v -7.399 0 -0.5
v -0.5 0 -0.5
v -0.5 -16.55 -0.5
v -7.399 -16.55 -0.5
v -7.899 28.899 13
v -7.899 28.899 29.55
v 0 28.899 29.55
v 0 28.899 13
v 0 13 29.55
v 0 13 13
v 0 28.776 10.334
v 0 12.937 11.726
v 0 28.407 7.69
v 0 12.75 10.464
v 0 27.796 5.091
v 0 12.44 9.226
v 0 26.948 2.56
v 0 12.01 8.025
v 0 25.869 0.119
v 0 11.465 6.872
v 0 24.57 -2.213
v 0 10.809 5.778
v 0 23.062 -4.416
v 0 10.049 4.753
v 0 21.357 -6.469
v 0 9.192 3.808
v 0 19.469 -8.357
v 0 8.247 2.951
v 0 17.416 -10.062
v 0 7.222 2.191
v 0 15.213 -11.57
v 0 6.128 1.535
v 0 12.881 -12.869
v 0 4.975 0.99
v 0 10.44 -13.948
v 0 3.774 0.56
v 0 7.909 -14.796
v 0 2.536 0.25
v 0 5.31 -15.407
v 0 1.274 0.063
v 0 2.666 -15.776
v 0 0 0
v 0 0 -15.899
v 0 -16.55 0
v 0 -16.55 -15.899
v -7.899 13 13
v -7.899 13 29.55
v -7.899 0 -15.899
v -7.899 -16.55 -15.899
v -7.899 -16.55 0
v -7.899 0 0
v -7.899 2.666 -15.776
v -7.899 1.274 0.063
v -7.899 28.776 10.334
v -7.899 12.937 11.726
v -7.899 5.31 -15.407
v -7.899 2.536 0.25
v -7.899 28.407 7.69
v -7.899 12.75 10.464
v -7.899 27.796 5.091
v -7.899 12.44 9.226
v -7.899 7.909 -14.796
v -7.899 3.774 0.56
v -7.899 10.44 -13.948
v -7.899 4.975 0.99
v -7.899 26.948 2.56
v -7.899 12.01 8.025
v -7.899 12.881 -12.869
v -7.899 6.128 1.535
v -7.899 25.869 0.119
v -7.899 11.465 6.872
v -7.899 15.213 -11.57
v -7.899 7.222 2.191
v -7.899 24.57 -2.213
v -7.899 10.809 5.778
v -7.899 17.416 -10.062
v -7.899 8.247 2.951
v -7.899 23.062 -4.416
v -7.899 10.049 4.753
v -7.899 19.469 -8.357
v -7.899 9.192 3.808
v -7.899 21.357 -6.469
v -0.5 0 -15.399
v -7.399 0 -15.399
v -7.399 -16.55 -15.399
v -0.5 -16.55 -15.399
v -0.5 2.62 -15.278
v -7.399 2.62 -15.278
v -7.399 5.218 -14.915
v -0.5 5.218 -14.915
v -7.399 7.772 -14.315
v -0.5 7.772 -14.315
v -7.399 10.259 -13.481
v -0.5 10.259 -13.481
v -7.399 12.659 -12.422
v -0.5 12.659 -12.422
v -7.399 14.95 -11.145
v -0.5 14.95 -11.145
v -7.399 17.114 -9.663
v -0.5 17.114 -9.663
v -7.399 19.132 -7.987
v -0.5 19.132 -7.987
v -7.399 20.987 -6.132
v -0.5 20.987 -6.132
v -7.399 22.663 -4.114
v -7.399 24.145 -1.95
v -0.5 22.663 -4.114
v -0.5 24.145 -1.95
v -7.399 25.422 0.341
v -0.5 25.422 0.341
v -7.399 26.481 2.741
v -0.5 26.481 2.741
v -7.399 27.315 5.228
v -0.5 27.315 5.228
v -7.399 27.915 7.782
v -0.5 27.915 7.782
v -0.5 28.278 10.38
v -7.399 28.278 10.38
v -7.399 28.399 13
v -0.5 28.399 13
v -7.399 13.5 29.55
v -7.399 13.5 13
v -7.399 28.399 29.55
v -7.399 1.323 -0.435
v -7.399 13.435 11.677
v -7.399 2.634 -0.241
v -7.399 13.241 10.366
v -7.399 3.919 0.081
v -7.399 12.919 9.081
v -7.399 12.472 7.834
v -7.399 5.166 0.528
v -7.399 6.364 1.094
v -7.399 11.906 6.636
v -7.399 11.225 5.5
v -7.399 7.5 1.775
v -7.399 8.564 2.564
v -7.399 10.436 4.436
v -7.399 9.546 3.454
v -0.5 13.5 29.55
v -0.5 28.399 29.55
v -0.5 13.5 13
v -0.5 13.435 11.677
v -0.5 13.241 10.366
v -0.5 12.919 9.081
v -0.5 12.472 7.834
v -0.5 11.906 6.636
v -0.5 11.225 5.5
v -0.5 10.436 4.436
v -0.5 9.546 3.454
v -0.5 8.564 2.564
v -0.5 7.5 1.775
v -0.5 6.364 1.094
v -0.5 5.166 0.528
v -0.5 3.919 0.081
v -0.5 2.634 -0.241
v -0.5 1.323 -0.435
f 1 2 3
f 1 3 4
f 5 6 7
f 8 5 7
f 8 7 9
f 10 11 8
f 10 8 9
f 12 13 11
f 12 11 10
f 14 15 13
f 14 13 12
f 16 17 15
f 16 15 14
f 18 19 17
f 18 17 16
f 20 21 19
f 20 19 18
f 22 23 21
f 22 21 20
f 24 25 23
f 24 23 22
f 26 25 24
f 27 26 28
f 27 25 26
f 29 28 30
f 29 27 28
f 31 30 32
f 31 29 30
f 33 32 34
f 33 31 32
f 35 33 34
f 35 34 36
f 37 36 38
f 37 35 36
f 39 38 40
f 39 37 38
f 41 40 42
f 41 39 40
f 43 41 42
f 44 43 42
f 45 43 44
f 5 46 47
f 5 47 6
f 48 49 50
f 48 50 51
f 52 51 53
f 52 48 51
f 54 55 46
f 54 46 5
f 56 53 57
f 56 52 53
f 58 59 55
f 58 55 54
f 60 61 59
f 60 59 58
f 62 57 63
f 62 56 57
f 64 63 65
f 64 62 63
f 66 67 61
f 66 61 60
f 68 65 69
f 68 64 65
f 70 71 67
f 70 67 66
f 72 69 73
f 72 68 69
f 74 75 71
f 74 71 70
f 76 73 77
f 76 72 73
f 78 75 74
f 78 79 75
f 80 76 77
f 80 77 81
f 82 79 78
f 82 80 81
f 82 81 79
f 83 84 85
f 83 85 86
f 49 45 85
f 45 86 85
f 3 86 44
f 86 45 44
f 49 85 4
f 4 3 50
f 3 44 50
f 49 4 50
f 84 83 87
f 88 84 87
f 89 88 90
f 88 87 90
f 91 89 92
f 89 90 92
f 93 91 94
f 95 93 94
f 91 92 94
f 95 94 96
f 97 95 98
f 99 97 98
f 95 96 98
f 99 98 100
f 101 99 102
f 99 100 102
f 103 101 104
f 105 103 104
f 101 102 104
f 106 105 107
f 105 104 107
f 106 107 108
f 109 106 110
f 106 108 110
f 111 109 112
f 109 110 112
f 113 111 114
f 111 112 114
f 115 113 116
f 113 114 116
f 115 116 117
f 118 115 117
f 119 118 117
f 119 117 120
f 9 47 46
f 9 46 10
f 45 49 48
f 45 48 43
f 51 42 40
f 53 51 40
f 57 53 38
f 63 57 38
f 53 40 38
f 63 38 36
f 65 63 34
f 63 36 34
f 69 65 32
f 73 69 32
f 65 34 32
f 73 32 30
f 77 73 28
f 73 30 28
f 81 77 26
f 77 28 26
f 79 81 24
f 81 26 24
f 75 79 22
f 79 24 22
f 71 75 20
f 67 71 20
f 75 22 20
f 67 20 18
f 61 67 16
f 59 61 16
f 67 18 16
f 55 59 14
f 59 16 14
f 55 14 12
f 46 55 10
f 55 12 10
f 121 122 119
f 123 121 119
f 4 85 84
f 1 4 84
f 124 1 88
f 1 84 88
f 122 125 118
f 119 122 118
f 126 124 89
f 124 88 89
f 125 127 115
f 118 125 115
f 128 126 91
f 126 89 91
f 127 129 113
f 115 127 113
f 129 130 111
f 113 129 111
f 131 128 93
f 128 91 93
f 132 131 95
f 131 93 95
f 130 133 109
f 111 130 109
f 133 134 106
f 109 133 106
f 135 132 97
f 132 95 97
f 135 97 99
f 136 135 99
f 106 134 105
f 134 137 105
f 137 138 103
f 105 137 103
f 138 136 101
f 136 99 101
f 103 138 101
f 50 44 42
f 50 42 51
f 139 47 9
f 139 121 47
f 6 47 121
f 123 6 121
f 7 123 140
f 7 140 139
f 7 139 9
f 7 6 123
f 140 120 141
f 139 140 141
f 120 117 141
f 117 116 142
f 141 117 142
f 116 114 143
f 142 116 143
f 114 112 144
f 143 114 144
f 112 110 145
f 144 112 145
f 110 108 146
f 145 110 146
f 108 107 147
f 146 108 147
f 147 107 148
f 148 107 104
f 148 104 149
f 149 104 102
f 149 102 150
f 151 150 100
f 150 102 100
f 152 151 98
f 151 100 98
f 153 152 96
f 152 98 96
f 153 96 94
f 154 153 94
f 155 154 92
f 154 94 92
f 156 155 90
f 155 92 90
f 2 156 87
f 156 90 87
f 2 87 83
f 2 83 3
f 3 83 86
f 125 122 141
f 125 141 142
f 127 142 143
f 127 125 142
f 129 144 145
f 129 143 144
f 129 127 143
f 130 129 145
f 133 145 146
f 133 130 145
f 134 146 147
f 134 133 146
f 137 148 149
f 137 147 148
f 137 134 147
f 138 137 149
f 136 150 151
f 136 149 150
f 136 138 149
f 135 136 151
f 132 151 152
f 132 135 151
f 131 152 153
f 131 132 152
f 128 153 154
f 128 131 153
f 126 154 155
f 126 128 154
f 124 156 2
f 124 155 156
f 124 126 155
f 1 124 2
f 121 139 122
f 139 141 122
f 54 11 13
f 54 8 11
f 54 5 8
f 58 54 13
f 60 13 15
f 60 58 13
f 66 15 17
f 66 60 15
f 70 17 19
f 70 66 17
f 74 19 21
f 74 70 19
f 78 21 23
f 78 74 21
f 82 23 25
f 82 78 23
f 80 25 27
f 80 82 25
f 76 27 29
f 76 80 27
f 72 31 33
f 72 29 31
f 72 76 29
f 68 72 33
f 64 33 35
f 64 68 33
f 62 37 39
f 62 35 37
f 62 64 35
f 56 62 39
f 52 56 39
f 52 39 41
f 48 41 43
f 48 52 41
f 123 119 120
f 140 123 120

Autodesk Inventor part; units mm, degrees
ref_plane "YZ Plane" through (0, 0, 0) normal (1, 0, 0) x (0, 1, 0)
ref_plane "XZ Plane" through (0, 0, 0) normal (0, 1, 0) x (-1, 0, 0)
ref_plane "XY Plane" through (0, 0, 0) normal (0, 0, 1) x (1, 0, 0)
sketch "Sketch1" plane through (0, 0, 0) normal (0, 1, 0) x (-1, 0, 0)
  line L0 (0, 0) -> (7.899, 0)
  line L1 (7.899, 0) -> (7.899, -15.899)
  line L2 (7.899, -15.899) -> (0, -15.899)
  line L3 (0, -15.899) -> (0, 0)
  line L4 (0.5, -0.5) -> (7.399, -0.5)
  line L5 (7.399, -0.5) -> (7.399, -15.399)
  line L6 (7.399, -15.399) -> (0.5, -15.399)
  line L7 (0.5, -15.399) -> (0.5, -0.5)
  dimension "d0" = 7.899
  dimension "d1" = 15.899
  dimension "d2" = 14.899
  dimension "d3" = 6.899
  dimension "d4" = 0.5
  dimension "d5" = 0.5
sketch "Sketch3" plane through (0, 0, 0) normal (1, 0, 0) x (0, 1, 0)
  arc A0 (0, 0) -> (13, 13) centre (0, 13) ccw
  line L0 (0, 13) -> (13, 13) construction
  line L1 (0, 13) -> (0, 0) construction
  dimension "d6" = 90
  dimension "d7" = 13
sweep "Sweep1" add profiles "Sketch1" path "Sketch3"
extrude "Extrusion1" add sketch "Sketch1" against normal blind 16.55
ref_plane "Work Plane1" through (-7.899, 13, 13) normal (0, 0, 1) x (1, 0, 0)
sketch "Sketch4" plane through (-7.899, 13, 13) normal (0, 0, 1) x (1, 0, 0)
  line L0 (0, 0) -> (7.899, 0)
  line L1 (0, 0) -> (0, 15.899)
  line L2 (0, 15.899) -> (7.899, 15.899)
  line L3 (7.899, 15.899) -> (7.899, 0)
  line L4 (0.5, 15.399) -> (7.399, 15.399)
  line L5 (7.399, 15.399) -> (7.399, 0.5)
  line L6 (7.399, 0.5) -> (0.5, 0.5)
  line L7 (7.399, 0.5) -> (0.5, 0.5) projected
  line L8 (0.5, 0.5) -> (0.5, 15.399)
extrude "Extrusion2" add sketch "Sketch4" along normal blind 16.55
properties part number "curved waveguide"
